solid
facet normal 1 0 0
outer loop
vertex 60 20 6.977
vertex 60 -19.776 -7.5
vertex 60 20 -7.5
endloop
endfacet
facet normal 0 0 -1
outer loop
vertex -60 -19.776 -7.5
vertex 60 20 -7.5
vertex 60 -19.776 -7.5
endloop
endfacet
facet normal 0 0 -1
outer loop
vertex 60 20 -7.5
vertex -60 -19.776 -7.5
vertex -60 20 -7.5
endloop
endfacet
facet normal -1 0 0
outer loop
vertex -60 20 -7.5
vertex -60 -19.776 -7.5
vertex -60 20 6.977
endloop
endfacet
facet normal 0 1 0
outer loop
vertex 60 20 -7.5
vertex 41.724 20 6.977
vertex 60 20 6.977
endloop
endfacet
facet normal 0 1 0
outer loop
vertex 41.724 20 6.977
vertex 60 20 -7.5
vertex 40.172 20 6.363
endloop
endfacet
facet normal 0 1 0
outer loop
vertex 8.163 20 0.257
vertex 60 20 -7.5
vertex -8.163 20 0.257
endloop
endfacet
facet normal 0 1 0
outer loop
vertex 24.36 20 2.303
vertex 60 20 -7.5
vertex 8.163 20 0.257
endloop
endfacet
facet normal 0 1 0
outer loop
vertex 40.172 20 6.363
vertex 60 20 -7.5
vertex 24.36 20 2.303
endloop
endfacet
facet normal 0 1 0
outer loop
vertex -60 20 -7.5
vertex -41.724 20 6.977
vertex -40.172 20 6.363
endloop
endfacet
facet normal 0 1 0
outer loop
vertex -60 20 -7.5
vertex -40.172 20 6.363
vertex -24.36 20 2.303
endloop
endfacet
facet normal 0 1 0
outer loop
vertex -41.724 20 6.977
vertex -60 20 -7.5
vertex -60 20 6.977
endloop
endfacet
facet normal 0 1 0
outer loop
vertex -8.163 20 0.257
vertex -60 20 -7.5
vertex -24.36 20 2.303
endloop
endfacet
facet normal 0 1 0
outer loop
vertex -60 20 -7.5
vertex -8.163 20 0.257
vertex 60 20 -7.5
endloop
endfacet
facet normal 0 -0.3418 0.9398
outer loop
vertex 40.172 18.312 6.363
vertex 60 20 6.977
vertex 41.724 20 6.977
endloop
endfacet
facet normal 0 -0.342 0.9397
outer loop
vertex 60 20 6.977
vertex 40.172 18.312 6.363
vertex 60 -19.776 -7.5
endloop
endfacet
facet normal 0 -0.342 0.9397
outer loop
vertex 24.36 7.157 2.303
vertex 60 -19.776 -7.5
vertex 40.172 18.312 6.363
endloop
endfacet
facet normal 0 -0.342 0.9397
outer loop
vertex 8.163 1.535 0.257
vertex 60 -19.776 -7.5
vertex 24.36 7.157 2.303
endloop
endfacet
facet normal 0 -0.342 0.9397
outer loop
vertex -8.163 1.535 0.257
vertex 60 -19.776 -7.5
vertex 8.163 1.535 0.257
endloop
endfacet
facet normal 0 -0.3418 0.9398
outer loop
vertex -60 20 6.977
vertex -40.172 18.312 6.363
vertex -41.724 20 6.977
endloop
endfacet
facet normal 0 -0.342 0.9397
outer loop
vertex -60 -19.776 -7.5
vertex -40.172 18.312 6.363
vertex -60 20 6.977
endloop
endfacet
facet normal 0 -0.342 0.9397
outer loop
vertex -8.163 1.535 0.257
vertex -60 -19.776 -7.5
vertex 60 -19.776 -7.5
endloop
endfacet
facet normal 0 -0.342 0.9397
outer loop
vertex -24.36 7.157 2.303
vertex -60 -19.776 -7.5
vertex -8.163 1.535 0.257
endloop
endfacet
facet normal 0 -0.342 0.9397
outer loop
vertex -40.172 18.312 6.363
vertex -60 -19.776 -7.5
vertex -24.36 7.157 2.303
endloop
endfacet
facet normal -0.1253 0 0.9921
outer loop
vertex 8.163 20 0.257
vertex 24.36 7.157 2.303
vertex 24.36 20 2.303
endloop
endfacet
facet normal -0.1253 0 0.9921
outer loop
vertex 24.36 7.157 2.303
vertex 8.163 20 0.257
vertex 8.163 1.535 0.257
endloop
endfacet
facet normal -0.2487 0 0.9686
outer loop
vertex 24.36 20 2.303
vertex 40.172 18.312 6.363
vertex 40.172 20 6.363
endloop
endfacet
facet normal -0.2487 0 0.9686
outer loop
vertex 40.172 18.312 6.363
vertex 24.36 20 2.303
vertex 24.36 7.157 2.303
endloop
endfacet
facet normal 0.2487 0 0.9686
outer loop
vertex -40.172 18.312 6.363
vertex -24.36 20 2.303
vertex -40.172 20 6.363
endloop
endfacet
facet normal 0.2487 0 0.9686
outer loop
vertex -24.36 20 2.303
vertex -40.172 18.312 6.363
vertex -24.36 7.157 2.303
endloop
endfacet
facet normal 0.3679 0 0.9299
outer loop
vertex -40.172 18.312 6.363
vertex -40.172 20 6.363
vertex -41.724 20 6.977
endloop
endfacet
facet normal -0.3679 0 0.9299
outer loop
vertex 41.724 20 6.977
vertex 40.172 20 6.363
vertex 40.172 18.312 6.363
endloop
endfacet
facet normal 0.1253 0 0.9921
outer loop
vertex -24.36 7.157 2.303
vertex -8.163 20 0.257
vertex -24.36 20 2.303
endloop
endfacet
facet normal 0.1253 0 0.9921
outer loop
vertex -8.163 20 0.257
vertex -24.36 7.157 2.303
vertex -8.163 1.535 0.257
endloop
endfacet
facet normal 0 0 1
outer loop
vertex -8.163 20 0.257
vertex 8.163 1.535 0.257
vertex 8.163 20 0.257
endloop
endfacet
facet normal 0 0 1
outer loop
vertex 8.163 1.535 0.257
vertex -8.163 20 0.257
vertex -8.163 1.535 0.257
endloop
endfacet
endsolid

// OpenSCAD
$fn=50;

support_width = 130;
support_length = 50;
support_height = 25;

difference(){
cube([120,40,15],true);
translate([0,0,13])rotate([20,0,0])cube([support_width*1.15,support_length*1.2,support_height],true);
translate([0,0,130])rotate([90,0,0])cylinder(h=support_length,r=support_width, center=true);
}
